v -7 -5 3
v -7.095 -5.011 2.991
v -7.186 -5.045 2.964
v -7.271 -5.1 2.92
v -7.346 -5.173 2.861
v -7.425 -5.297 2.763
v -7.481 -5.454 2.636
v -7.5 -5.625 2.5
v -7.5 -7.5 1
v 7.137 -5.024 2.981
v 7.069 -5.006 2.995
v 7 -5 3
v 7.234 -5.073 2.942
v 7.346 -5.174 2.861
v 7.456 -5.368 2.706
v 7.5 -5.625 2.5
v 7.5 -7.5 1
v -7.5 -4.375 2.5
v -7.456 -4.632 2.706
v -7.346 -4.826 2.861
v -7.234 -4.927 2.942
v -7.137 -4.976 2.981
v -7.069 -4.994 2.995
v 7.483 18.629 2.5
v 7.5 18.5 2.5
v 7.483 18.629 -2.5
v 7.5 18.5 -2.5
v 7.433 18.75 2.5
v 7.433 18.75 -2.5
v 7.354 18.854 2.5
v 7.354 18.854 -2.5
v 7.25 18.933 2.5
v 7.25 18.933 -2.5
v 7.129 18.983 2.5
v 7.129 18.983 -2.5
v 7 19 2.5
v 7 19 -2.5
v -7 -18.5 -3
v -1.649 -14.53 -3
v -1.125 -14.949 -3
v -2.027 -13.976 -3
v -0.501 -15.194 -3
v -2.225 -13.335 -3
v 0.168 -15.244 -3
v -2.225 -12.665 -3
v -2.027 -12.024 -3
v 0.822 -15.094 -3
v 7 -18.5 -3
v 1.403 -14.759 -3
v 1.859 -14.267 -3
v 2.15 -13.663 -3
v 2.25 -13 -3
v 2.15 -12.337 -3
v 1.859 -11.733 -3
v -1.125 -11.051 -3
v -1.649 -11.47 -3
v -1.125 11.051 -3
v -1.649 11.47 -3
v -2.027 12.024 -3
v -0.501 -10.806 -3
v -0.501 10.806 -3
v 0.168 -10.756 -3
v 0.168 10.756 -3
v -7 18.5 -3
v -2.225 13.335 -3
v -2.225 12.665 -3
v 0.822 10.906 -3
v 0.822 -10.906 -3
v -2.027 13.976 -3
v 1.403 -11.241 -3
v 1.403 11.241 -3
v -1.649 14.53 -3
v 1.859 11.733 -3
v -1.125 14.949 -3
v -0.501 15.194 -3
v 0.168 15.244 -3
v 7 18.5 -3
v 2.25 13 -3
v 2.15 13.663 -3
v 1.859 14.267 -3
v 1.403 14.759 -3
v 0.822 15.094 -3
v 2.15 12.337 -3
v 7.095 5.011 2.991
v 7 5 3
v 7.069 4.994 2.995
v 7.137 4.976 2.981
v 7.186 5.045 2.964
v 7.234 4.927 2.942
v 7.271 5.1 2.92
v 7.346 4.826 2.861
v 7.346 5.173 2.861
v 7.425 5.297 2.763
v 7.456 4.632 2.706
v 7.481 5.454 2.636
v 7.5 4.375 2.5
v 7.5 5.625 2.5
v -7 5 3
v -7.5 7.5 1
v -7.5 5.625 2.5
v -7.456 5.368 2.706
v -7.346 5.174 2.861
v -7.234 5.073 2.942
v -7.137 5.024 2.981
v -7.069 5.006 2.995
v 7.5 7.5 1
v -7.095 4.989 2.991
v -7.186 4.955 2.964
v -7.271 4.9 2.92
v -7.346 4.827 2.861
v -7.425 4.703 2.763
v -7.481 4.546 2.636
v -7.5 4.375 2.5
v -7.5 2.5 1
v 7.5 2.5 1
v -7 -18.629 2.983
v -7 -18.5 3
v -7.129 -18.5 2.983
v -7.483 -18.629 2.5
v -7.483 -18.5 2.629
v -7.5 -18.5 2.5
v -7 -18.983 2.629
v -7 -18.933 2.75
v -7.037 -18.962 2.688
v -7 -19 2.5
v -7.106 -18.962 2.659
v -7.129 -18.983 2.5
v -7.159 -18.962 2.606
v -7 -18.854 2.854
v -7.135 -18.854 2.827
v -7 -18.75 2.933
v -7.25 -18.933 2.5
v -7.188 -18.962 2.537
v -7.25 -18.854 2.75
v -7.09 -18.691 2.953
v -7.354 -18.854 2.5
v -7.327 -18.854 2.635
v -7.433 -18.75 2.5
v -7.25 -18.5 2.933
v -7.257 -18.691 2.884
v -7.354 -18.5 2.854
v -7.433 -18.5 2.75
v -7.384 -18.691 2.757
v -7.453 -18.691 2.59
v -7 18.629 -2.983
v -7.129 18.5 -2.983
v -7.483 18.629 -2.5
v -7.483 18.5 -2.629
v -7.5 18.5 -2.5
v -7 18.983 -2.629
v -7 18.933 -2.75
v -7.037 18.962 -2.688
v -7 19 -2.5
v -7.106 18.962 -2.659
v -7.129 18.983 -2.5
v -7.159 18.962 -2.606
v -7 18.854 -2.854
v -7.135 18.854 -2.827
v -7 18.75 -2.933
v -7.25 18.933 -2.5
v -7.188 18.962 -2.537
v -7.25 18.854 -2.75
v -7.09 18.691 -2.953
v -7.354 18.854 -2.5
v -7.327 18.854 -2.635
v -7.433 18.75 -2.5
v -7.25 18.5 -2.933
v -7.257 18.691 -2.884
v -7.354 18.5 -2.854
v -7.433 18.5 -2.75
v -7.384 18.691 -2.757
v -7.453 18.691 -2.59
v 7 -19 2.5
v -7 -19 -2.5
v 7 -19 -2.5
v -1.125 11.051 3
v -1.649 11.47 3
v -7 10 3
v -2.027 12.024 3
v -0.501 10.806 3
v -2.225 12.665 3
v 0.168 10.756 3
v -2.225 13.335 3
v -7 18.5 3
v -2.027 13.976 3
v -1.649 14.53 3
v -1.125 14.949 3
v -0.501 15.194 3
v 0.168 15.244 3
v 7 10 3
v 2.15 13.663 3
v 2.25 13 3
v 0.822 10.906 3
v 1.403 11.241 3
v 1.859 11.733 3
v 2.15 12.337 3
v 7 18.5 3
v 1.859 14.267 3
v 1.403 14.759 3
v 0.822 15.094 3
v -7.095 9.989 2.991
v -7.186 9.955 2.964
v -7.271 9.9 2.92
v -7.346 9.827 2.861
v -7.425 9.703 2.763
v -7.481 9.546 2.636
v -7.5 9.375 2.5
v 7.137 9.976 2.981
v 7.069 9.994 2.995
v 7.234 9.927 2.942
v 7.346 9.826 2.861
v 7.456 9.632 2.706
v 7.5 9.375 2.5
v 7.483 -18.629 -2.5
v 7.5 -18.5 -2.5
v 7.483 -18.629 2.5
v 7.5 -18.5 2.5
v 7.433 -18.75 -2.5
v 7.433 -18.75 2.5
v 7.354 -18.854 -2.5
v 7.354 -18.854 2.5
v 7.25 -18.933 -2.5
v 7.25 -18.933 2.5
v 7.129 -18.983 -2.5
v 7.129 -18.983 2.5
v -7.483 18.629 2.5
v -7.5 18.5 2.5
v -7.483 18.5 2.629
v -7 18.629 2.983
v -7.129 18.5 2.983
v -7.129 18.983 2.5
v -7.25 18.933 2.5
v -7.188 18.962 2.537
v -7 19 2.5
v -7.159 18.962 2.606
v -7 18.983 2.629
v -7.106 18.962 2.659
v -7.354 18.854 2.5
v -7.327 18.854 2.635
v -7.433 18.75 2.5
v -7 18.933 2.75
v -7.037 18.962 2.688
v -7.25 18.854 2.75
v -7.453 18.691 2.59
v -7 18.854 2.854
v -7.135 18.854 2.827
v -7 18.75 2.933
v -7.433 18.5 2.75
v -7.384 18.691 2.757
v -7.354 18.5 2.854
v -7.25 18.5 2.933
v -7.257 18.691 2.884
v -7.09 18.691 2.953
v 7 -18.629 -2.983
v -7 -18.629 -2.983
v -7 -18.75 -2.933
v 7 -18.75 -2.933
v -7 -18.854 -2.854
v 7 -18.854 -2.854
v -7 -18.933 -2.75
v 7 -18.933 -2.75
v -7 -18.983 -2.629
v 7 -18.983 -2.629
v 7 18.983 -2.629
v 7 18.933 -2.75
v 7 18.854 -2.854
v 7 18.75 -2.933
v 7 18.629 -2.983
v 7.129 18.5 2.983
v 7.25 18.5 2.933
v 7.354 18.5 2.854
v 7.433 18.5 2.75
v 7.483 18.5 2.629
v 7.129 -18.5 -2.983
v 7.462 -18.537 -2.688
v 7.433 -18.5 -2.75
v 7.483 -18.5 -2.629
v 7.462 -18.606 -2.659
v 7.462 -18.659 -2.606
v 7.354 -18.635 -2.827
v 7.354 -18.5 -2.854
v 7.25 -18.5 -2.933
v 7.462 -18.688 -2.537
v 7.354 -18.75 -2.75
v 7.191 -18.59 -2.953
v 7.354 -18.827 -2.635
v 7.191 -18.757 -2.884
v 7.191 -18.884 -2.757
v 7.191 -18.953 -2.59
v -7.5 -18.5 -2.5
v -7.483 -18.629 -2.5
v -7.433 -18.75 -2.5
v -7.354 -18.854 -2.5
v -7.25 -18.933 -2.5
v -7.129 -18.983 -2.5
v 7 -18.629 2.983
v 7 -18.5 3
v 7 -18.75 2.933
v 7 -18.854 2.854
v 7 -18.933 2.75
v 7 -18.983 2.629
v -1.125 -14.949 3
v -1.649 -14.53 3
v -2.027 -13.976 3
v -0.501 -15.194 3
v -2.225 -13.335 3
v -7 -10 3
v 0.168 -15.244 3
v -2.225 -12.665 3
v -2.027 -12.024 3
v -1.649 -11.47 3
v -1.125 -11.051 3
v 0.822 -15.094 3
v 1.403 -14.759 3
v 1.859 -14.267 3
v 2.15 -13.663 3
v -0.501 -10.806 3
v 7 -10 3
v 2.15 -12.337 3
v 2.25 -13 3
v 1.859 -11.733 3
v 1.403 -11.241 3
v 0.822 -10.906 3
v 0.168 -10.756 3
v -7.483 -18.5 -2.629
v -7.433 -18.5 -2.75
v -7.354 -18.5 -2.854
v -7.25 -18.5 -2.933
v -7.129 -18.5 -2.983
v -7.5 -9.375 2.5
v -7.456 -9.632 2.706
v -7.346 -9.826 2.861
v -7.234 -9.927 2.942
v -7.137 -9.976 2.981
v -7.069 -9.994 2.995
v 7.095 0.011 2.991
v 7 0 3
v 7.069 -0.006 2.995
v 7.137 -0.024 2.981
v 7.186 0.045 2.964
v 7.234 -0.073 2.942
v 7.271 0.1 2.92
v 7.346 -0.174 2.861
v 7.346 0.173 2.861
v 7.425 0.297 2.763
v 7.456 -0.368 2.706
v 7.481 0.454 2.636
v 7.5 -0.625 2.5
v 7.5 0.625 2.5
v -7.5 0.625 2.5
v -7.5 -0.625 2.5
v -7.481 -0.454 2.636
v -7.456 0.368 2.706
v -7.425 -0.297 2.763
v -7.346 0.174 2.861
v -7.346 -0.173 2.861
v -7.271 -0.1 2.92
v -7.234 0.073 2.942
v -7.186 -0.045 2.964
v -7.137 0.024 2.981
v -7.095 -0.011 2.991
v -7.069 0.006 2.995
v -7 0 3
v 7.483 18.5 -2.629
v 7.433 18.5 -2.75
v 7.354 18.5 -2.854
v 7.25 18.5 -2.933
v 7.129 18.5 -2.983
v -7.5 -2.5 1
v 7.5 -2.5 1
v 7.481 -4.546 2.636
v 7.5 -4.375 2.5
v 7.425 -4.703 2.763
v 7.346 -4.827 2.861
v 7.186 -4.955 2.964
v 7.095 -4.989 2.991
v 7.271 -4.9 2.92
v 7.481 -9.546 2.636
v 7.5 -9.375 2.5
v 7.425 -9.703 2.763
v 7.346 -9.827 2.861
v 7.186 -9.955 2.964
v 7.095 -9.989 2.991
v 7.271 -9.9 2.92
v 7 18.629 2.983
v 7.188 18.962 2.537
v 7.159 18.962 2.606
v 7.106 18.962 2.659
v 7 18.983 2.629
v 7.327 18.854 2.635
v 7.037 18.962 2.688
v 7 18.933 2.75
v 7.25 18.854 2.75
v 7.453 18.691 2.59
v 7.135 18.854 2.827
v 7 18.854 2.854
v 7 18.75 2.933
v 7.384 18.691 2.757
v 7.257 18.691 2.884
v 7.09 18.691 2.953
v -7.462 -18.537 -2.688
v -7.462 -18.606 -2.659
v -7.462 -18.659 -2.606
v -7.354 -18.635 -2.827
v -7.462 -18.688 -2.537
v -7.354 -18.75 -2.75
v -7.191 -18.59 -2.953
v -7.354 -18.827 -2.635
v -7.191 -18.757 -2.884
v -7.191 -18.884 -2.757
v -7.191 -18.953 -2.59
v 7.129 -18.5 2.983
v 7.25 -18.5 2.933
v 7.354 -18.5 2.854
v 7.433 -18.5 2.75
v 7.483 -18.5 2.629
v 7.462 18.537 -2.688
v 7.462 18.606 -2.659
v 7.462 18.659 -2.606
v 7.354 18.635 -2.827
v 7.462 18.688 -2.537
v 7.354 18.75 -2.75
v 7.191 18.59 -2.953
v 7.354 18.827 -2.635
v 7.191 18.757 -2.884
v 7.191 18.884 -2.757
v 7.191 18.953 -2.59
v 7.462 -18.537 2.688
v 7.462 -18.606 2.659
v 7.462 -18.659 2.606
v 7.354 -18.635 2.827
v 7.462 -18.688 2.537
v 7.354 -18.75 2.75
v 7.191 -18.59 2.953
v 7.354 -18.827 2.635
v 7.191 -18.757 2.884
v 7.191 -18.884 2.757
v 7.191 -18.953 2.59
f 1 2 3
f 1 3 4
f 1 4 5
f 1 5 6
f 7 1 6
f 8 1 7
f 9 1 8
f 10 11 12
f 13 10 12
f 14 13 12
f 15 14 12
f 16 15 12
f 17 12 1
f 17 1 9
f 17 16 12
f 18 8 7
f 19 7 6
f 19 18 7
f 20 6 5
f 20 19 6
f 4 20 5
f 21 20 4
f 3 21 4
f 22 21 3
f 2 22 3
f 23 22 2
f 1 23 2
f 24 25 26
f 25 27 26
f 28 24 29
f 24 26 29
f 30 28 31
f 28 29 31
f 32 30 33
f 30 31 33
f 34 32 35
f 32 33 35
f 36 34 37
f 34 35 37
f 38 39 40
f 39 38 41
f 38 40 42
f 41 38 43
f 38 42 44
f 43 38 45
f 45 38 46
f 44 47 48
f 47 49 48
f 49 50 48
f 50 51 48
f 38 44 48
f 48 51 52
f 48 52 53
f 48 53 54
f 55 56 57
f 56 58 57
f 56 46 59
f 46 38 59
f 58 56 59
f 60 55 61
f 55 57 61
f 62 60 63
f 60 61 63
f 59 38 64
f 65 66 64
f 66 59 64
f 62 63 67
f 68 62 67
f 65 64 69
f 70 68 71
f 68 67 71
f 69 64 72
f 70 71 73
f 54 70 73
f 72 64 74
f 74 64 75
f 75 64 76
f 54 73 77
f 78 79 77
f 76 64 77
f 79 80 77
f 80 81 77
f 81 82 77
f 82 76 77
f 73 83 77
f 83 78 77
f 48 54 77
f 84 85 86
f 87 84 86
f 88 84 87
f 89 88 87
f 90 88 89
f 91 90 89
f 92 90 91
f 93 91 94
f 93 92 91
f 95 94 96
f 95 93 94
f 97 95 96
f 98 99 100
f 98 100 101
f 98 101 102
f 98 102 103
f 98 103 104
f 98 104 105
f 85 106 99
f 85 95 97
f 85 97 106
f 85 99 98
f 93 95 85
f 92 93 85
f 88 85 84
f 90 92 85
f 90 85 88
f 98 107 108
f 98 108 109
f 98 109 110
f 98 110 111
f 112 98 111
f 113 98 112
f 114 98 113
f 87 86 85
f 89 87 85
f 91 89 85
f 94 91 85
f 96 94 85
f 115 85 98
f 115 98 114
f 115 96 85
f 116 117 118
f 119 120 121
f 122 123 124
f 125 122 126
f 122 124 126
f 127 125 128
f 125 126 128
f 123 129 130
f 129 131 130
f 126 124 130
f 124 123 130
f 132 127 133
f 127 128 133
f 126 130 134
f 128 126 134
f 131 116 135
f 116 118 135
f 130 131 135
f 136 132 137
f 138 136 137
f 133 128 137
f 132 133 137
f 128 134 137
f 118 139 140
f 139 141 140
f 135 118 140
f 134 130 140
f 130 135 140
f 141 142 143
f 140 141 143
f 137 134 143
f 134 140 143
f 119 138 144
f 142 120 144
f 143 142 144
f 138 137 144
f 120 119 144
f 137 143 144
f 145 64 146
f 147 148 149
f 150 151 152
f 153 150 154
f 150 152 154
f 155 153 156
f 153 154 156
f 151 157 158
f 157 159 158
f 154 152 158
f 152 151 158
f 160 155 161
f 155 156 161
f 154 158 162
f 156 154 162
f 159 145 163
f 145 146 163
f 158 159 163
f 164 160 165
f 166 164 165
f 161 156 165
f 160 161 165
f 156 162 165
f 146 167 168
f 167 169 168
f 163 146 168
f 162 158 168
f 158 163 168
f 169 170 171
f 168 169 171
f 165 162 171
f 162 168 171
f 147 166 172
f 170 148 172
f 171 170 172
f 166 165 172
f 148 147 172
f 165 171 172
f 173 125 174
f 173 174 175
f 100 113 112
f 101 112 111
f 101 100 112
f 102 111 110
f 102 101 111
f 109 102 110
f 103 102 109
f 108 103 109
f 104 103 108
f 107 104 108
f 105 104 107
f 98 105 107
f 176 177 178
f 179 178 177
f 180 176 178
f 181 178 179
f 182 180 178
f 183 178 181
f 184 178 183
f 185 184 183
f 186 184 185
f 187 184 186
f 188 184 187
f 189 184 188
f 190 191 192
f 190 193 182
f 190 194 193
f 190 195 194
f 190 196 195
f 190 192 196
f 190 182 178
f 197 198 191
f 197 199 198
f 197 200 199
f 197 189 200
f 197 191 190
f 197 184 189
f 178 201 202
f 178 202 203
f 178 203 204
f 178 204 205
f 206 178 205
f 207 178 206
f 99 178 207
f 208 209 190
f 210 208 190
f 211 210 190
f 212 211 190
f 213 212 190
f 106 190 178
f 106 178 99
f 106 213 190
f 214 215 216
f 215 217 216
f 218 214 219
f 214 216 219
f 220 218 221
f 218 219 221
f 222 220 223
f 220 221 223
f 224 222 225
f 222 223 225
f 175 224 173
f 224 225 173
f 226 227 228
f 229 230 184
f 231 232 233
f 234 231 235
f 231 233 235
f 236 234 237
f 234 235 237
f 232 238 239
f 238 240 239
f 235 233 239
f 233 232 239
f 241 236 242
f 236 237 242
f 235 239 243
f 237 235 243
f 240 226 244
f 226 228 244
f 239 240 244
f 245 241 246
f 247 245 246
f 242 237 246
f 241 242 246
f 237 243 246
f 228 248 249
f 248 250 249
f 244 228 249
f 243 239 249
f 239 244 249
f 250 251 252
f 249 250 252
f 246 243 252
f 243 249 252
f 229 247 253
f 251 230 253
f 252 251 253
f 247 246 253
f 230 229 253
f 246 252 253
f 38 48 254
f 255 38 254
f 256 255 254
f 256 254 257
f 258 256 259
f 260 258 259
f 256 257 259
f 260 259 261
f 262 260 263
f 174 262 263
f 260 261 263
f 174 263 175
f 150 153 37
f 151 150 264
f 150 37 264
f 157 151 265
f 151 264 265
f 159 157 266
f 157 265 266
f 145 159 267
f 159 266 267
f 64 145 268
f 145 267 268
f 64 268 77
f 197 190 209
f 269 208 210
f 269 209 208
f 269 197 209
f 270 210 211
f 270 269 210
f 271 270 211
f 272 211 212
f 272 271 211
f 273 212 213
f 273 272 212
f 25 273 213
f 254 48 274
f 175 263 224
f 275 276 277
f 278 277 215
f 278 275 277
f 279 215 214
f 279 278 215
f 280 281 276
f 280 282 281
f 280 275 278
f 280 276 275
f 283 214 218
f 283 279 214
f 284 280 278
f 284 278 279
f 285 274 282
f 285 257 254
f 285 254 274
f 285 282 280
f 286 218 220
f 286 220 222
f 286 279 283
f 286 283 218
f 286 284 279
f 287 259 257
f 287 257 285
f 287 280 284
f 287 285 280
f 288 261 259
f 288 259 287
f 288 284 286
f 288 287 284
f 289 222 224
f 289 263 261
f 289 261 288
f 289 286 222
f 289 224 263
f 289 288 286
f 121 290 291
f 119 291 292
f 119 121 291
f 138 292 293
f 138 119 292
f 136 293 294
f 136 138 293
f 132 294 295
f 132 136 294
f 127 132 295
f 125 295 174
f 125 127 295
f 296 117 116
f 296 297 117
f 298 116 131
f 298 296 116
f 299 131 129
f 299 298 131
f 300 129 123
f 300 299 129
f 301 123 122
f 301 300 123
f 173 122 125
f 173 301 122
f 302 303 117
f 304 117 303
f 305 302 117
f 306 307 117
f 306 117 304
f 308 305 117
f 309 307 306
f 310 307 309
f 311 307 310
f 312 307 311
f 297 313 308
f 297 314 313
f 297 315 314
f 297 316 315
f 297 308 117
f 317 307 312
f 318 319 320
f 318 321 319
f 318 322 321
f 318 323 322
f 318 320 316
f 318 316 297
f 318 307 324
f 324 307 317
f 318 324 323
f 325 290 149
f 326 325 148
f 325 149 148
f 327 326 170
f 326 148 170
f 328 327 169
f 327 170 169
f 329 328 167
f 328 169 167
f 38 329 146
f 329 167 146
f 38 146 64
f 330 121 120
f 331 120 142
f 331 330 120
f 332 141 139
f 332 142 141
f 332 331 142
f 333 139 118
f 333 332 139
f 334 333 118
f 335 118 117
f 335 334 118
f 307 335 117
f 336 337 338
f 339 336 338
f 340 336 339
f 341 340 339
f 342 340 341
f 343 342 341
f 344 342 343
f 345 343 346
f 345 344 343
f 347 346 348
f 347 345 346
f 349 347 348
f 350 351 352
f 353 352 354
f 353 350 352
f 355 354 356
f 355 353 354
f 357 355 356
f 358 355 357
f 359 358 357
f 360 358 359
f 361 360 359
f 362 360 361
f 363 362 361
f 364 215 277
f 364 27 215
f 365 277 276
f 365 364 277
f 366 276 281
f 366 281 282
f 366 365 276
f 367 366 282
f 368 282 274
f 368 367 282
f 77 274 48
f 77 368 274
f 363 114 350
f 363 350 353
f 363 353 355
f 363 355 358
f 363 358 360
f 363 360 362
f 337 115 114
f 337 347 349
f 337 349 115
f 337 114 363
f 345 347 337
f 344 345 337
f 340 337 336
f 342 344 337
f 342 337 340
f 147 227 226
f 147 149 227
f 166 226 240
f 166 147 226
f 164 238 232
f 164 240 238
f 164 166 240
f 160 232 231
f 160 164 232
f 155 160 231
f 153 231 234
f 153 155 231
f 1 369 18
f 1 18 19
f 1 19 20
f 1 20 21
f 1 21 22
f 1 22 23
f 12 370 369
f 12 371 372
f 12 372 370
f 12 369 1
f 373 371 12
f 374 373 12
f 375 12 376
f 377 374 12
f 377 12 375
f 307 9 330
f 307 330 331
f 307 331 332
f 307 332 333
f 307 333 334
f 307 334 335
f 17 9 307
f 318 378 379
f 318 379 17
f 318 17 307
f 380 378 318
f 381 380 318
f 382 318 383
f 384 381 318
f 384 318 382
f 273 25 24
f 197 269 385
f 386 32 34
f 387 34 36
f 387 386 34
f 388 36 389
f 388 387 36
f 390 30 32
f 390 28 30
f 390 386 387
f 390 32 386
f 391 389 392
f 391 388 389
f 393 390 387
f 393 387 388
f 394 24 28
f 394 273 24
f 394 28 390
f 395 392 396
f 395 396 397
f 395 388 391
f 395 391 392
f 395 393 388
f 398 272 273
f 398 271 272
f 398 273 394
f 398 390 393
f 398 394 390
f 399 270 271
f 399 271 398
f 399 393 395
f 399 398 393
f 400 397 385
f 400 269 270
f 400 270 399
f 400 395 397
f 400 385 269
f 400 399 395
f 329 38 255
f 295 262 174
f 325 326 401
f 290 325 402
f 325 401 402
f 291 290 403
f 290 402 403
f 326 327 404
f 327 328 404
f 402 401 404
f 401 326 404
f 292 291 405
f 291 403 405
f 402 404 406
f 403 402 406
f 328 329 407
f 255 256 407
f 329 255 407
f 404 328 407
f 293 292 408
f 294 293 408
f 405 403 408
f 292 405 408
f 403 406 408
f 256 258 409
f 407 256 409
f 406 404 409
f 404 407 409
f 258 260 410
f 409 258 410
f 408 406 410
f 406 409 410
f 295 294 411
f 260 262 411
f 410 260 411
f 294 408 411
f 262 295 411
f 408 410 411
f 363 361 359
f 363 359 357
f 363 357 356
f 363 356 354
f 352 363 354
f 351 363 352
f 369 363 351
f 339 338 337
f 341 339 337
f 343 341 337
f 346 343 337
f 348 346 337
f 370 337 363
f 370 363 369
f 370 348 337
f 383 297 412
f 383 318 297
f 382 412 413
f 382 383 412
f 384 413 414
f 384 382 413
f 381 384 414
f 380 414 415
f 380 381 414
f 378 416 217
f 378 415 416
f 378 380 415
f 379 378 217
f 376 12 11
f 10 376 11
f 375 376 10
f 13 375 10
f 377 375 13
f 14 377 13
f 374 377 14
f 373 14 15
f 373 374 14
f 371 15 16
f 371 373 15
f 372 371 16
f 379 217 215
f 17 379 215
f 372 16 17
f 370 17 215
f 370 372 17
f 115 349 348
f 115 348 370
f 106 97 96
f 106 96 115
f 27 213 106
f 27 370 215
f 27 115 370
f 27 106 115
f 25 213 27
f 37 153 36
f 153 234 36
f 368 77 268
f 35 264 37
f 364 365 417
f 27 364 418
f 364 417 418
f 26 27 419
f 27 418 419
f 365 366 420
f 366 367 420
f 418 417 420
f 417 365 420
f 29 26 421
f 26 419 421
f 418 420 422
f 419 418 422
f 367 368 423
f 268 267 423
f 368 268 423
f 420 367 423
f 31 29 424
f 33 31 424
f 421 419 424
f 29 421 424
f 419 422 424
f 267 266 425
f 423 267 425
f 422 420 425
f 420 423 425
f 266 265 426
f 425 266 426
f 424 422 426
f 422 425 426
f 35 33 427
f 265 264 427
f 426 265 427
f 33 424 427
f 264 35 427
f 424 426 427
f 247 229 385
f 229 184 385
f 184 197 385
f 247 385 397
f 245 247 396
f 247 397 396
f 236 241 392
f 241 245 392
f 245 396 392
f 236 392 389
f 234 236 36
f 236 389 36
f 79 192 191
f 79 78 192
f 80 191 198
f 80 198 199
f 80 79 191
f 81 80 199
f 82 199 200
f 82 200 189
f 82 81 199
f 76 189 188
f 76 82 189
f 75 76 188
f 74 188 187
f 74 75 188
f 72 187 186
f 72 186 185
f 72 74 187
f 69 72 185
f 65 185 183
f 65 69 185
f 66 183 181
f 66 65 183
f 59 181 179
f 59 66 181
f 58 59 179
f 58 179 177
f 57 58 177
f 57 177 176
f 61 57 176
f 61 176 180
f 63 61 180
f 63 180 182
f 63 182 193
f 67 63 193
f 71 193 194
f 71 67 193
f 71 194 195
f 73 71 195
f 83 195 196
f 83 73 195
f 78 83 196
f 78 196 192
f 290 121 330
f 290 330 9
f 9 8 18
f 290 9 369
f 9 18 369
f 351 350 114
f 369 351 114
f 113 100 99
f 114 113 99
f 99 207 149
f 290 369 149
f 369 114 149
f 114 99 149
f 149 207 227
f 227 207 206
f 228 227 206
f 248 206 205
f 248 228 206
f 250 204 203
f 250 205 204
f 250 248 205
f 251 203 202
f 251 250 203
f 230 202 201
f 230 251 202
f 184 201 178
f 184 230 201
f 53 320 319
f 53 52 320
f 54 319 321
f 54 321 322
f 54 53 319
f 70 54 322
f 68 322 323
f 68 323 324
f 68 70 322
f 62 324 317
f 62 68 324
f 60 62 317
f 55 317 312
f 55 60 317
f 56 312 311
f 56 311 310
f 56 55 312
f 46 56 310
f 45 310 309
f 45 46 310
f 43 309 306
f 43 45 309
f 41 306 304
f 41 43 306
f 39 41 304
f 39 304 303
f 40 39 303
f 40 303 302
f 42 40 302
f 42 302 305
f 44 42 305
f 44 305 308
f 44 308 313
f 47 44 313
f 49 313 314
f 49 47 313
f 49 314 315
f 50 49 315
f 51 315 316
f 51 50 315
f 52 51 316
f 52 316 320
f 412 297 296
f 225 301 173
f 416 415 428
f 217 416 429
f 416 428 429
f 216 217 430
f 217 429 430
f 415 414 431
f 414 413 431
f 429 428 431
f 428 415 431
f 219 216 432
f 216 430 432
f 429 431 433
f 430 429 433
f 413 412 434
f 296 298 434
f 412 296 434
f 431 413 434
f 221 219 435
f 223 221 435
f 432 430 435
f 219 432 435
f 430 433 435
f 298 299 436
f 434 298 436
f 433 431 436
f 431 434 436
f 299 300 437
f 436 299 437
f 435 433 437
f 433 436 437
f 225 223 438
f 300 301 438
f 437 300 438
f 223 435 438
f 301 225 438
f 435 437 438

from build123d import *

# Parameters (mm, degrees)
SKETCH_1_W             = 15
SKETCH_1_H             = 38
SKETCH_1_R             = 2.25
EXTRUDE_1_DEPTH        = 3
FILLET_1_R             = 0.5
CUT_EXTRUDE_1_DEPTH    = 7.5
PATTERN_LINEAR_1_COUNT = 4
PATTERN_LINEAR_1_PITCH = 5


with BuildPart() as part:
    # 草图1 → 凸台-拉伸1 (new, symmetric)
    with BuildSketch(Plane.XY):
        Rectangle(SKETCH_1_W, SKETCH_1_H)
        with Locations((0, 13)):
            Circle(SKETCH_1_R, mode=Mode.SUBTRACT)
        with Locations((0, -13)):
            Circle(SKETCH_1_R, mode=Mode.SUBTRACT)
    extrude(amount=EXTRUDE_1_DEPTH, both=True)

    # 圆角1
    fillet_1_edges = [part.edges().sort_by_distance(p)[0] for p in [
        (-7.5, 0, 3),
        (0, -19, 3),
        (7.5, 0, 3),
        (0, -19, -3),
        (-7.5, 0, -3),
        (0, 19, -3),
        (7.5, 0, -3),
        (7.5, -19, 0),
        (-7.5, -19, 0),
        (-7.5, 19, 0),
        (7.5, 19, 0),
        (0, 19, 3),
    ]]
    fillet(fillet_1_edges, radius=FILLET_1_R)

    # 草图2 → 切除-拉伸1 (cut, symmetric)
    with BuildSketch(Plane(origin=(0, 0, 0), x_dir=(0, 0, -1), z_dir=(1, 0, 0))):
        Polygon((-3, 10), (-1, 7.5), (-3, 5), align=None)
    cut_extrude_1 = extrude(amount=CUT_EXTRUDE_1_DEPTH, both=True, mode=Mode.SUBTRACT)

    # 阵列(线性)1: 切除-拉伸1 ×4
    with Locations(*[(0, -i * PATTERN_LINEAR_1_PITCH, 0) for i in range(1, PATTERN_LINEAR_1_COUNT)]):
        add(cut_extrude_1, mode=Mode.SUBTRACT)


solid = part.part
